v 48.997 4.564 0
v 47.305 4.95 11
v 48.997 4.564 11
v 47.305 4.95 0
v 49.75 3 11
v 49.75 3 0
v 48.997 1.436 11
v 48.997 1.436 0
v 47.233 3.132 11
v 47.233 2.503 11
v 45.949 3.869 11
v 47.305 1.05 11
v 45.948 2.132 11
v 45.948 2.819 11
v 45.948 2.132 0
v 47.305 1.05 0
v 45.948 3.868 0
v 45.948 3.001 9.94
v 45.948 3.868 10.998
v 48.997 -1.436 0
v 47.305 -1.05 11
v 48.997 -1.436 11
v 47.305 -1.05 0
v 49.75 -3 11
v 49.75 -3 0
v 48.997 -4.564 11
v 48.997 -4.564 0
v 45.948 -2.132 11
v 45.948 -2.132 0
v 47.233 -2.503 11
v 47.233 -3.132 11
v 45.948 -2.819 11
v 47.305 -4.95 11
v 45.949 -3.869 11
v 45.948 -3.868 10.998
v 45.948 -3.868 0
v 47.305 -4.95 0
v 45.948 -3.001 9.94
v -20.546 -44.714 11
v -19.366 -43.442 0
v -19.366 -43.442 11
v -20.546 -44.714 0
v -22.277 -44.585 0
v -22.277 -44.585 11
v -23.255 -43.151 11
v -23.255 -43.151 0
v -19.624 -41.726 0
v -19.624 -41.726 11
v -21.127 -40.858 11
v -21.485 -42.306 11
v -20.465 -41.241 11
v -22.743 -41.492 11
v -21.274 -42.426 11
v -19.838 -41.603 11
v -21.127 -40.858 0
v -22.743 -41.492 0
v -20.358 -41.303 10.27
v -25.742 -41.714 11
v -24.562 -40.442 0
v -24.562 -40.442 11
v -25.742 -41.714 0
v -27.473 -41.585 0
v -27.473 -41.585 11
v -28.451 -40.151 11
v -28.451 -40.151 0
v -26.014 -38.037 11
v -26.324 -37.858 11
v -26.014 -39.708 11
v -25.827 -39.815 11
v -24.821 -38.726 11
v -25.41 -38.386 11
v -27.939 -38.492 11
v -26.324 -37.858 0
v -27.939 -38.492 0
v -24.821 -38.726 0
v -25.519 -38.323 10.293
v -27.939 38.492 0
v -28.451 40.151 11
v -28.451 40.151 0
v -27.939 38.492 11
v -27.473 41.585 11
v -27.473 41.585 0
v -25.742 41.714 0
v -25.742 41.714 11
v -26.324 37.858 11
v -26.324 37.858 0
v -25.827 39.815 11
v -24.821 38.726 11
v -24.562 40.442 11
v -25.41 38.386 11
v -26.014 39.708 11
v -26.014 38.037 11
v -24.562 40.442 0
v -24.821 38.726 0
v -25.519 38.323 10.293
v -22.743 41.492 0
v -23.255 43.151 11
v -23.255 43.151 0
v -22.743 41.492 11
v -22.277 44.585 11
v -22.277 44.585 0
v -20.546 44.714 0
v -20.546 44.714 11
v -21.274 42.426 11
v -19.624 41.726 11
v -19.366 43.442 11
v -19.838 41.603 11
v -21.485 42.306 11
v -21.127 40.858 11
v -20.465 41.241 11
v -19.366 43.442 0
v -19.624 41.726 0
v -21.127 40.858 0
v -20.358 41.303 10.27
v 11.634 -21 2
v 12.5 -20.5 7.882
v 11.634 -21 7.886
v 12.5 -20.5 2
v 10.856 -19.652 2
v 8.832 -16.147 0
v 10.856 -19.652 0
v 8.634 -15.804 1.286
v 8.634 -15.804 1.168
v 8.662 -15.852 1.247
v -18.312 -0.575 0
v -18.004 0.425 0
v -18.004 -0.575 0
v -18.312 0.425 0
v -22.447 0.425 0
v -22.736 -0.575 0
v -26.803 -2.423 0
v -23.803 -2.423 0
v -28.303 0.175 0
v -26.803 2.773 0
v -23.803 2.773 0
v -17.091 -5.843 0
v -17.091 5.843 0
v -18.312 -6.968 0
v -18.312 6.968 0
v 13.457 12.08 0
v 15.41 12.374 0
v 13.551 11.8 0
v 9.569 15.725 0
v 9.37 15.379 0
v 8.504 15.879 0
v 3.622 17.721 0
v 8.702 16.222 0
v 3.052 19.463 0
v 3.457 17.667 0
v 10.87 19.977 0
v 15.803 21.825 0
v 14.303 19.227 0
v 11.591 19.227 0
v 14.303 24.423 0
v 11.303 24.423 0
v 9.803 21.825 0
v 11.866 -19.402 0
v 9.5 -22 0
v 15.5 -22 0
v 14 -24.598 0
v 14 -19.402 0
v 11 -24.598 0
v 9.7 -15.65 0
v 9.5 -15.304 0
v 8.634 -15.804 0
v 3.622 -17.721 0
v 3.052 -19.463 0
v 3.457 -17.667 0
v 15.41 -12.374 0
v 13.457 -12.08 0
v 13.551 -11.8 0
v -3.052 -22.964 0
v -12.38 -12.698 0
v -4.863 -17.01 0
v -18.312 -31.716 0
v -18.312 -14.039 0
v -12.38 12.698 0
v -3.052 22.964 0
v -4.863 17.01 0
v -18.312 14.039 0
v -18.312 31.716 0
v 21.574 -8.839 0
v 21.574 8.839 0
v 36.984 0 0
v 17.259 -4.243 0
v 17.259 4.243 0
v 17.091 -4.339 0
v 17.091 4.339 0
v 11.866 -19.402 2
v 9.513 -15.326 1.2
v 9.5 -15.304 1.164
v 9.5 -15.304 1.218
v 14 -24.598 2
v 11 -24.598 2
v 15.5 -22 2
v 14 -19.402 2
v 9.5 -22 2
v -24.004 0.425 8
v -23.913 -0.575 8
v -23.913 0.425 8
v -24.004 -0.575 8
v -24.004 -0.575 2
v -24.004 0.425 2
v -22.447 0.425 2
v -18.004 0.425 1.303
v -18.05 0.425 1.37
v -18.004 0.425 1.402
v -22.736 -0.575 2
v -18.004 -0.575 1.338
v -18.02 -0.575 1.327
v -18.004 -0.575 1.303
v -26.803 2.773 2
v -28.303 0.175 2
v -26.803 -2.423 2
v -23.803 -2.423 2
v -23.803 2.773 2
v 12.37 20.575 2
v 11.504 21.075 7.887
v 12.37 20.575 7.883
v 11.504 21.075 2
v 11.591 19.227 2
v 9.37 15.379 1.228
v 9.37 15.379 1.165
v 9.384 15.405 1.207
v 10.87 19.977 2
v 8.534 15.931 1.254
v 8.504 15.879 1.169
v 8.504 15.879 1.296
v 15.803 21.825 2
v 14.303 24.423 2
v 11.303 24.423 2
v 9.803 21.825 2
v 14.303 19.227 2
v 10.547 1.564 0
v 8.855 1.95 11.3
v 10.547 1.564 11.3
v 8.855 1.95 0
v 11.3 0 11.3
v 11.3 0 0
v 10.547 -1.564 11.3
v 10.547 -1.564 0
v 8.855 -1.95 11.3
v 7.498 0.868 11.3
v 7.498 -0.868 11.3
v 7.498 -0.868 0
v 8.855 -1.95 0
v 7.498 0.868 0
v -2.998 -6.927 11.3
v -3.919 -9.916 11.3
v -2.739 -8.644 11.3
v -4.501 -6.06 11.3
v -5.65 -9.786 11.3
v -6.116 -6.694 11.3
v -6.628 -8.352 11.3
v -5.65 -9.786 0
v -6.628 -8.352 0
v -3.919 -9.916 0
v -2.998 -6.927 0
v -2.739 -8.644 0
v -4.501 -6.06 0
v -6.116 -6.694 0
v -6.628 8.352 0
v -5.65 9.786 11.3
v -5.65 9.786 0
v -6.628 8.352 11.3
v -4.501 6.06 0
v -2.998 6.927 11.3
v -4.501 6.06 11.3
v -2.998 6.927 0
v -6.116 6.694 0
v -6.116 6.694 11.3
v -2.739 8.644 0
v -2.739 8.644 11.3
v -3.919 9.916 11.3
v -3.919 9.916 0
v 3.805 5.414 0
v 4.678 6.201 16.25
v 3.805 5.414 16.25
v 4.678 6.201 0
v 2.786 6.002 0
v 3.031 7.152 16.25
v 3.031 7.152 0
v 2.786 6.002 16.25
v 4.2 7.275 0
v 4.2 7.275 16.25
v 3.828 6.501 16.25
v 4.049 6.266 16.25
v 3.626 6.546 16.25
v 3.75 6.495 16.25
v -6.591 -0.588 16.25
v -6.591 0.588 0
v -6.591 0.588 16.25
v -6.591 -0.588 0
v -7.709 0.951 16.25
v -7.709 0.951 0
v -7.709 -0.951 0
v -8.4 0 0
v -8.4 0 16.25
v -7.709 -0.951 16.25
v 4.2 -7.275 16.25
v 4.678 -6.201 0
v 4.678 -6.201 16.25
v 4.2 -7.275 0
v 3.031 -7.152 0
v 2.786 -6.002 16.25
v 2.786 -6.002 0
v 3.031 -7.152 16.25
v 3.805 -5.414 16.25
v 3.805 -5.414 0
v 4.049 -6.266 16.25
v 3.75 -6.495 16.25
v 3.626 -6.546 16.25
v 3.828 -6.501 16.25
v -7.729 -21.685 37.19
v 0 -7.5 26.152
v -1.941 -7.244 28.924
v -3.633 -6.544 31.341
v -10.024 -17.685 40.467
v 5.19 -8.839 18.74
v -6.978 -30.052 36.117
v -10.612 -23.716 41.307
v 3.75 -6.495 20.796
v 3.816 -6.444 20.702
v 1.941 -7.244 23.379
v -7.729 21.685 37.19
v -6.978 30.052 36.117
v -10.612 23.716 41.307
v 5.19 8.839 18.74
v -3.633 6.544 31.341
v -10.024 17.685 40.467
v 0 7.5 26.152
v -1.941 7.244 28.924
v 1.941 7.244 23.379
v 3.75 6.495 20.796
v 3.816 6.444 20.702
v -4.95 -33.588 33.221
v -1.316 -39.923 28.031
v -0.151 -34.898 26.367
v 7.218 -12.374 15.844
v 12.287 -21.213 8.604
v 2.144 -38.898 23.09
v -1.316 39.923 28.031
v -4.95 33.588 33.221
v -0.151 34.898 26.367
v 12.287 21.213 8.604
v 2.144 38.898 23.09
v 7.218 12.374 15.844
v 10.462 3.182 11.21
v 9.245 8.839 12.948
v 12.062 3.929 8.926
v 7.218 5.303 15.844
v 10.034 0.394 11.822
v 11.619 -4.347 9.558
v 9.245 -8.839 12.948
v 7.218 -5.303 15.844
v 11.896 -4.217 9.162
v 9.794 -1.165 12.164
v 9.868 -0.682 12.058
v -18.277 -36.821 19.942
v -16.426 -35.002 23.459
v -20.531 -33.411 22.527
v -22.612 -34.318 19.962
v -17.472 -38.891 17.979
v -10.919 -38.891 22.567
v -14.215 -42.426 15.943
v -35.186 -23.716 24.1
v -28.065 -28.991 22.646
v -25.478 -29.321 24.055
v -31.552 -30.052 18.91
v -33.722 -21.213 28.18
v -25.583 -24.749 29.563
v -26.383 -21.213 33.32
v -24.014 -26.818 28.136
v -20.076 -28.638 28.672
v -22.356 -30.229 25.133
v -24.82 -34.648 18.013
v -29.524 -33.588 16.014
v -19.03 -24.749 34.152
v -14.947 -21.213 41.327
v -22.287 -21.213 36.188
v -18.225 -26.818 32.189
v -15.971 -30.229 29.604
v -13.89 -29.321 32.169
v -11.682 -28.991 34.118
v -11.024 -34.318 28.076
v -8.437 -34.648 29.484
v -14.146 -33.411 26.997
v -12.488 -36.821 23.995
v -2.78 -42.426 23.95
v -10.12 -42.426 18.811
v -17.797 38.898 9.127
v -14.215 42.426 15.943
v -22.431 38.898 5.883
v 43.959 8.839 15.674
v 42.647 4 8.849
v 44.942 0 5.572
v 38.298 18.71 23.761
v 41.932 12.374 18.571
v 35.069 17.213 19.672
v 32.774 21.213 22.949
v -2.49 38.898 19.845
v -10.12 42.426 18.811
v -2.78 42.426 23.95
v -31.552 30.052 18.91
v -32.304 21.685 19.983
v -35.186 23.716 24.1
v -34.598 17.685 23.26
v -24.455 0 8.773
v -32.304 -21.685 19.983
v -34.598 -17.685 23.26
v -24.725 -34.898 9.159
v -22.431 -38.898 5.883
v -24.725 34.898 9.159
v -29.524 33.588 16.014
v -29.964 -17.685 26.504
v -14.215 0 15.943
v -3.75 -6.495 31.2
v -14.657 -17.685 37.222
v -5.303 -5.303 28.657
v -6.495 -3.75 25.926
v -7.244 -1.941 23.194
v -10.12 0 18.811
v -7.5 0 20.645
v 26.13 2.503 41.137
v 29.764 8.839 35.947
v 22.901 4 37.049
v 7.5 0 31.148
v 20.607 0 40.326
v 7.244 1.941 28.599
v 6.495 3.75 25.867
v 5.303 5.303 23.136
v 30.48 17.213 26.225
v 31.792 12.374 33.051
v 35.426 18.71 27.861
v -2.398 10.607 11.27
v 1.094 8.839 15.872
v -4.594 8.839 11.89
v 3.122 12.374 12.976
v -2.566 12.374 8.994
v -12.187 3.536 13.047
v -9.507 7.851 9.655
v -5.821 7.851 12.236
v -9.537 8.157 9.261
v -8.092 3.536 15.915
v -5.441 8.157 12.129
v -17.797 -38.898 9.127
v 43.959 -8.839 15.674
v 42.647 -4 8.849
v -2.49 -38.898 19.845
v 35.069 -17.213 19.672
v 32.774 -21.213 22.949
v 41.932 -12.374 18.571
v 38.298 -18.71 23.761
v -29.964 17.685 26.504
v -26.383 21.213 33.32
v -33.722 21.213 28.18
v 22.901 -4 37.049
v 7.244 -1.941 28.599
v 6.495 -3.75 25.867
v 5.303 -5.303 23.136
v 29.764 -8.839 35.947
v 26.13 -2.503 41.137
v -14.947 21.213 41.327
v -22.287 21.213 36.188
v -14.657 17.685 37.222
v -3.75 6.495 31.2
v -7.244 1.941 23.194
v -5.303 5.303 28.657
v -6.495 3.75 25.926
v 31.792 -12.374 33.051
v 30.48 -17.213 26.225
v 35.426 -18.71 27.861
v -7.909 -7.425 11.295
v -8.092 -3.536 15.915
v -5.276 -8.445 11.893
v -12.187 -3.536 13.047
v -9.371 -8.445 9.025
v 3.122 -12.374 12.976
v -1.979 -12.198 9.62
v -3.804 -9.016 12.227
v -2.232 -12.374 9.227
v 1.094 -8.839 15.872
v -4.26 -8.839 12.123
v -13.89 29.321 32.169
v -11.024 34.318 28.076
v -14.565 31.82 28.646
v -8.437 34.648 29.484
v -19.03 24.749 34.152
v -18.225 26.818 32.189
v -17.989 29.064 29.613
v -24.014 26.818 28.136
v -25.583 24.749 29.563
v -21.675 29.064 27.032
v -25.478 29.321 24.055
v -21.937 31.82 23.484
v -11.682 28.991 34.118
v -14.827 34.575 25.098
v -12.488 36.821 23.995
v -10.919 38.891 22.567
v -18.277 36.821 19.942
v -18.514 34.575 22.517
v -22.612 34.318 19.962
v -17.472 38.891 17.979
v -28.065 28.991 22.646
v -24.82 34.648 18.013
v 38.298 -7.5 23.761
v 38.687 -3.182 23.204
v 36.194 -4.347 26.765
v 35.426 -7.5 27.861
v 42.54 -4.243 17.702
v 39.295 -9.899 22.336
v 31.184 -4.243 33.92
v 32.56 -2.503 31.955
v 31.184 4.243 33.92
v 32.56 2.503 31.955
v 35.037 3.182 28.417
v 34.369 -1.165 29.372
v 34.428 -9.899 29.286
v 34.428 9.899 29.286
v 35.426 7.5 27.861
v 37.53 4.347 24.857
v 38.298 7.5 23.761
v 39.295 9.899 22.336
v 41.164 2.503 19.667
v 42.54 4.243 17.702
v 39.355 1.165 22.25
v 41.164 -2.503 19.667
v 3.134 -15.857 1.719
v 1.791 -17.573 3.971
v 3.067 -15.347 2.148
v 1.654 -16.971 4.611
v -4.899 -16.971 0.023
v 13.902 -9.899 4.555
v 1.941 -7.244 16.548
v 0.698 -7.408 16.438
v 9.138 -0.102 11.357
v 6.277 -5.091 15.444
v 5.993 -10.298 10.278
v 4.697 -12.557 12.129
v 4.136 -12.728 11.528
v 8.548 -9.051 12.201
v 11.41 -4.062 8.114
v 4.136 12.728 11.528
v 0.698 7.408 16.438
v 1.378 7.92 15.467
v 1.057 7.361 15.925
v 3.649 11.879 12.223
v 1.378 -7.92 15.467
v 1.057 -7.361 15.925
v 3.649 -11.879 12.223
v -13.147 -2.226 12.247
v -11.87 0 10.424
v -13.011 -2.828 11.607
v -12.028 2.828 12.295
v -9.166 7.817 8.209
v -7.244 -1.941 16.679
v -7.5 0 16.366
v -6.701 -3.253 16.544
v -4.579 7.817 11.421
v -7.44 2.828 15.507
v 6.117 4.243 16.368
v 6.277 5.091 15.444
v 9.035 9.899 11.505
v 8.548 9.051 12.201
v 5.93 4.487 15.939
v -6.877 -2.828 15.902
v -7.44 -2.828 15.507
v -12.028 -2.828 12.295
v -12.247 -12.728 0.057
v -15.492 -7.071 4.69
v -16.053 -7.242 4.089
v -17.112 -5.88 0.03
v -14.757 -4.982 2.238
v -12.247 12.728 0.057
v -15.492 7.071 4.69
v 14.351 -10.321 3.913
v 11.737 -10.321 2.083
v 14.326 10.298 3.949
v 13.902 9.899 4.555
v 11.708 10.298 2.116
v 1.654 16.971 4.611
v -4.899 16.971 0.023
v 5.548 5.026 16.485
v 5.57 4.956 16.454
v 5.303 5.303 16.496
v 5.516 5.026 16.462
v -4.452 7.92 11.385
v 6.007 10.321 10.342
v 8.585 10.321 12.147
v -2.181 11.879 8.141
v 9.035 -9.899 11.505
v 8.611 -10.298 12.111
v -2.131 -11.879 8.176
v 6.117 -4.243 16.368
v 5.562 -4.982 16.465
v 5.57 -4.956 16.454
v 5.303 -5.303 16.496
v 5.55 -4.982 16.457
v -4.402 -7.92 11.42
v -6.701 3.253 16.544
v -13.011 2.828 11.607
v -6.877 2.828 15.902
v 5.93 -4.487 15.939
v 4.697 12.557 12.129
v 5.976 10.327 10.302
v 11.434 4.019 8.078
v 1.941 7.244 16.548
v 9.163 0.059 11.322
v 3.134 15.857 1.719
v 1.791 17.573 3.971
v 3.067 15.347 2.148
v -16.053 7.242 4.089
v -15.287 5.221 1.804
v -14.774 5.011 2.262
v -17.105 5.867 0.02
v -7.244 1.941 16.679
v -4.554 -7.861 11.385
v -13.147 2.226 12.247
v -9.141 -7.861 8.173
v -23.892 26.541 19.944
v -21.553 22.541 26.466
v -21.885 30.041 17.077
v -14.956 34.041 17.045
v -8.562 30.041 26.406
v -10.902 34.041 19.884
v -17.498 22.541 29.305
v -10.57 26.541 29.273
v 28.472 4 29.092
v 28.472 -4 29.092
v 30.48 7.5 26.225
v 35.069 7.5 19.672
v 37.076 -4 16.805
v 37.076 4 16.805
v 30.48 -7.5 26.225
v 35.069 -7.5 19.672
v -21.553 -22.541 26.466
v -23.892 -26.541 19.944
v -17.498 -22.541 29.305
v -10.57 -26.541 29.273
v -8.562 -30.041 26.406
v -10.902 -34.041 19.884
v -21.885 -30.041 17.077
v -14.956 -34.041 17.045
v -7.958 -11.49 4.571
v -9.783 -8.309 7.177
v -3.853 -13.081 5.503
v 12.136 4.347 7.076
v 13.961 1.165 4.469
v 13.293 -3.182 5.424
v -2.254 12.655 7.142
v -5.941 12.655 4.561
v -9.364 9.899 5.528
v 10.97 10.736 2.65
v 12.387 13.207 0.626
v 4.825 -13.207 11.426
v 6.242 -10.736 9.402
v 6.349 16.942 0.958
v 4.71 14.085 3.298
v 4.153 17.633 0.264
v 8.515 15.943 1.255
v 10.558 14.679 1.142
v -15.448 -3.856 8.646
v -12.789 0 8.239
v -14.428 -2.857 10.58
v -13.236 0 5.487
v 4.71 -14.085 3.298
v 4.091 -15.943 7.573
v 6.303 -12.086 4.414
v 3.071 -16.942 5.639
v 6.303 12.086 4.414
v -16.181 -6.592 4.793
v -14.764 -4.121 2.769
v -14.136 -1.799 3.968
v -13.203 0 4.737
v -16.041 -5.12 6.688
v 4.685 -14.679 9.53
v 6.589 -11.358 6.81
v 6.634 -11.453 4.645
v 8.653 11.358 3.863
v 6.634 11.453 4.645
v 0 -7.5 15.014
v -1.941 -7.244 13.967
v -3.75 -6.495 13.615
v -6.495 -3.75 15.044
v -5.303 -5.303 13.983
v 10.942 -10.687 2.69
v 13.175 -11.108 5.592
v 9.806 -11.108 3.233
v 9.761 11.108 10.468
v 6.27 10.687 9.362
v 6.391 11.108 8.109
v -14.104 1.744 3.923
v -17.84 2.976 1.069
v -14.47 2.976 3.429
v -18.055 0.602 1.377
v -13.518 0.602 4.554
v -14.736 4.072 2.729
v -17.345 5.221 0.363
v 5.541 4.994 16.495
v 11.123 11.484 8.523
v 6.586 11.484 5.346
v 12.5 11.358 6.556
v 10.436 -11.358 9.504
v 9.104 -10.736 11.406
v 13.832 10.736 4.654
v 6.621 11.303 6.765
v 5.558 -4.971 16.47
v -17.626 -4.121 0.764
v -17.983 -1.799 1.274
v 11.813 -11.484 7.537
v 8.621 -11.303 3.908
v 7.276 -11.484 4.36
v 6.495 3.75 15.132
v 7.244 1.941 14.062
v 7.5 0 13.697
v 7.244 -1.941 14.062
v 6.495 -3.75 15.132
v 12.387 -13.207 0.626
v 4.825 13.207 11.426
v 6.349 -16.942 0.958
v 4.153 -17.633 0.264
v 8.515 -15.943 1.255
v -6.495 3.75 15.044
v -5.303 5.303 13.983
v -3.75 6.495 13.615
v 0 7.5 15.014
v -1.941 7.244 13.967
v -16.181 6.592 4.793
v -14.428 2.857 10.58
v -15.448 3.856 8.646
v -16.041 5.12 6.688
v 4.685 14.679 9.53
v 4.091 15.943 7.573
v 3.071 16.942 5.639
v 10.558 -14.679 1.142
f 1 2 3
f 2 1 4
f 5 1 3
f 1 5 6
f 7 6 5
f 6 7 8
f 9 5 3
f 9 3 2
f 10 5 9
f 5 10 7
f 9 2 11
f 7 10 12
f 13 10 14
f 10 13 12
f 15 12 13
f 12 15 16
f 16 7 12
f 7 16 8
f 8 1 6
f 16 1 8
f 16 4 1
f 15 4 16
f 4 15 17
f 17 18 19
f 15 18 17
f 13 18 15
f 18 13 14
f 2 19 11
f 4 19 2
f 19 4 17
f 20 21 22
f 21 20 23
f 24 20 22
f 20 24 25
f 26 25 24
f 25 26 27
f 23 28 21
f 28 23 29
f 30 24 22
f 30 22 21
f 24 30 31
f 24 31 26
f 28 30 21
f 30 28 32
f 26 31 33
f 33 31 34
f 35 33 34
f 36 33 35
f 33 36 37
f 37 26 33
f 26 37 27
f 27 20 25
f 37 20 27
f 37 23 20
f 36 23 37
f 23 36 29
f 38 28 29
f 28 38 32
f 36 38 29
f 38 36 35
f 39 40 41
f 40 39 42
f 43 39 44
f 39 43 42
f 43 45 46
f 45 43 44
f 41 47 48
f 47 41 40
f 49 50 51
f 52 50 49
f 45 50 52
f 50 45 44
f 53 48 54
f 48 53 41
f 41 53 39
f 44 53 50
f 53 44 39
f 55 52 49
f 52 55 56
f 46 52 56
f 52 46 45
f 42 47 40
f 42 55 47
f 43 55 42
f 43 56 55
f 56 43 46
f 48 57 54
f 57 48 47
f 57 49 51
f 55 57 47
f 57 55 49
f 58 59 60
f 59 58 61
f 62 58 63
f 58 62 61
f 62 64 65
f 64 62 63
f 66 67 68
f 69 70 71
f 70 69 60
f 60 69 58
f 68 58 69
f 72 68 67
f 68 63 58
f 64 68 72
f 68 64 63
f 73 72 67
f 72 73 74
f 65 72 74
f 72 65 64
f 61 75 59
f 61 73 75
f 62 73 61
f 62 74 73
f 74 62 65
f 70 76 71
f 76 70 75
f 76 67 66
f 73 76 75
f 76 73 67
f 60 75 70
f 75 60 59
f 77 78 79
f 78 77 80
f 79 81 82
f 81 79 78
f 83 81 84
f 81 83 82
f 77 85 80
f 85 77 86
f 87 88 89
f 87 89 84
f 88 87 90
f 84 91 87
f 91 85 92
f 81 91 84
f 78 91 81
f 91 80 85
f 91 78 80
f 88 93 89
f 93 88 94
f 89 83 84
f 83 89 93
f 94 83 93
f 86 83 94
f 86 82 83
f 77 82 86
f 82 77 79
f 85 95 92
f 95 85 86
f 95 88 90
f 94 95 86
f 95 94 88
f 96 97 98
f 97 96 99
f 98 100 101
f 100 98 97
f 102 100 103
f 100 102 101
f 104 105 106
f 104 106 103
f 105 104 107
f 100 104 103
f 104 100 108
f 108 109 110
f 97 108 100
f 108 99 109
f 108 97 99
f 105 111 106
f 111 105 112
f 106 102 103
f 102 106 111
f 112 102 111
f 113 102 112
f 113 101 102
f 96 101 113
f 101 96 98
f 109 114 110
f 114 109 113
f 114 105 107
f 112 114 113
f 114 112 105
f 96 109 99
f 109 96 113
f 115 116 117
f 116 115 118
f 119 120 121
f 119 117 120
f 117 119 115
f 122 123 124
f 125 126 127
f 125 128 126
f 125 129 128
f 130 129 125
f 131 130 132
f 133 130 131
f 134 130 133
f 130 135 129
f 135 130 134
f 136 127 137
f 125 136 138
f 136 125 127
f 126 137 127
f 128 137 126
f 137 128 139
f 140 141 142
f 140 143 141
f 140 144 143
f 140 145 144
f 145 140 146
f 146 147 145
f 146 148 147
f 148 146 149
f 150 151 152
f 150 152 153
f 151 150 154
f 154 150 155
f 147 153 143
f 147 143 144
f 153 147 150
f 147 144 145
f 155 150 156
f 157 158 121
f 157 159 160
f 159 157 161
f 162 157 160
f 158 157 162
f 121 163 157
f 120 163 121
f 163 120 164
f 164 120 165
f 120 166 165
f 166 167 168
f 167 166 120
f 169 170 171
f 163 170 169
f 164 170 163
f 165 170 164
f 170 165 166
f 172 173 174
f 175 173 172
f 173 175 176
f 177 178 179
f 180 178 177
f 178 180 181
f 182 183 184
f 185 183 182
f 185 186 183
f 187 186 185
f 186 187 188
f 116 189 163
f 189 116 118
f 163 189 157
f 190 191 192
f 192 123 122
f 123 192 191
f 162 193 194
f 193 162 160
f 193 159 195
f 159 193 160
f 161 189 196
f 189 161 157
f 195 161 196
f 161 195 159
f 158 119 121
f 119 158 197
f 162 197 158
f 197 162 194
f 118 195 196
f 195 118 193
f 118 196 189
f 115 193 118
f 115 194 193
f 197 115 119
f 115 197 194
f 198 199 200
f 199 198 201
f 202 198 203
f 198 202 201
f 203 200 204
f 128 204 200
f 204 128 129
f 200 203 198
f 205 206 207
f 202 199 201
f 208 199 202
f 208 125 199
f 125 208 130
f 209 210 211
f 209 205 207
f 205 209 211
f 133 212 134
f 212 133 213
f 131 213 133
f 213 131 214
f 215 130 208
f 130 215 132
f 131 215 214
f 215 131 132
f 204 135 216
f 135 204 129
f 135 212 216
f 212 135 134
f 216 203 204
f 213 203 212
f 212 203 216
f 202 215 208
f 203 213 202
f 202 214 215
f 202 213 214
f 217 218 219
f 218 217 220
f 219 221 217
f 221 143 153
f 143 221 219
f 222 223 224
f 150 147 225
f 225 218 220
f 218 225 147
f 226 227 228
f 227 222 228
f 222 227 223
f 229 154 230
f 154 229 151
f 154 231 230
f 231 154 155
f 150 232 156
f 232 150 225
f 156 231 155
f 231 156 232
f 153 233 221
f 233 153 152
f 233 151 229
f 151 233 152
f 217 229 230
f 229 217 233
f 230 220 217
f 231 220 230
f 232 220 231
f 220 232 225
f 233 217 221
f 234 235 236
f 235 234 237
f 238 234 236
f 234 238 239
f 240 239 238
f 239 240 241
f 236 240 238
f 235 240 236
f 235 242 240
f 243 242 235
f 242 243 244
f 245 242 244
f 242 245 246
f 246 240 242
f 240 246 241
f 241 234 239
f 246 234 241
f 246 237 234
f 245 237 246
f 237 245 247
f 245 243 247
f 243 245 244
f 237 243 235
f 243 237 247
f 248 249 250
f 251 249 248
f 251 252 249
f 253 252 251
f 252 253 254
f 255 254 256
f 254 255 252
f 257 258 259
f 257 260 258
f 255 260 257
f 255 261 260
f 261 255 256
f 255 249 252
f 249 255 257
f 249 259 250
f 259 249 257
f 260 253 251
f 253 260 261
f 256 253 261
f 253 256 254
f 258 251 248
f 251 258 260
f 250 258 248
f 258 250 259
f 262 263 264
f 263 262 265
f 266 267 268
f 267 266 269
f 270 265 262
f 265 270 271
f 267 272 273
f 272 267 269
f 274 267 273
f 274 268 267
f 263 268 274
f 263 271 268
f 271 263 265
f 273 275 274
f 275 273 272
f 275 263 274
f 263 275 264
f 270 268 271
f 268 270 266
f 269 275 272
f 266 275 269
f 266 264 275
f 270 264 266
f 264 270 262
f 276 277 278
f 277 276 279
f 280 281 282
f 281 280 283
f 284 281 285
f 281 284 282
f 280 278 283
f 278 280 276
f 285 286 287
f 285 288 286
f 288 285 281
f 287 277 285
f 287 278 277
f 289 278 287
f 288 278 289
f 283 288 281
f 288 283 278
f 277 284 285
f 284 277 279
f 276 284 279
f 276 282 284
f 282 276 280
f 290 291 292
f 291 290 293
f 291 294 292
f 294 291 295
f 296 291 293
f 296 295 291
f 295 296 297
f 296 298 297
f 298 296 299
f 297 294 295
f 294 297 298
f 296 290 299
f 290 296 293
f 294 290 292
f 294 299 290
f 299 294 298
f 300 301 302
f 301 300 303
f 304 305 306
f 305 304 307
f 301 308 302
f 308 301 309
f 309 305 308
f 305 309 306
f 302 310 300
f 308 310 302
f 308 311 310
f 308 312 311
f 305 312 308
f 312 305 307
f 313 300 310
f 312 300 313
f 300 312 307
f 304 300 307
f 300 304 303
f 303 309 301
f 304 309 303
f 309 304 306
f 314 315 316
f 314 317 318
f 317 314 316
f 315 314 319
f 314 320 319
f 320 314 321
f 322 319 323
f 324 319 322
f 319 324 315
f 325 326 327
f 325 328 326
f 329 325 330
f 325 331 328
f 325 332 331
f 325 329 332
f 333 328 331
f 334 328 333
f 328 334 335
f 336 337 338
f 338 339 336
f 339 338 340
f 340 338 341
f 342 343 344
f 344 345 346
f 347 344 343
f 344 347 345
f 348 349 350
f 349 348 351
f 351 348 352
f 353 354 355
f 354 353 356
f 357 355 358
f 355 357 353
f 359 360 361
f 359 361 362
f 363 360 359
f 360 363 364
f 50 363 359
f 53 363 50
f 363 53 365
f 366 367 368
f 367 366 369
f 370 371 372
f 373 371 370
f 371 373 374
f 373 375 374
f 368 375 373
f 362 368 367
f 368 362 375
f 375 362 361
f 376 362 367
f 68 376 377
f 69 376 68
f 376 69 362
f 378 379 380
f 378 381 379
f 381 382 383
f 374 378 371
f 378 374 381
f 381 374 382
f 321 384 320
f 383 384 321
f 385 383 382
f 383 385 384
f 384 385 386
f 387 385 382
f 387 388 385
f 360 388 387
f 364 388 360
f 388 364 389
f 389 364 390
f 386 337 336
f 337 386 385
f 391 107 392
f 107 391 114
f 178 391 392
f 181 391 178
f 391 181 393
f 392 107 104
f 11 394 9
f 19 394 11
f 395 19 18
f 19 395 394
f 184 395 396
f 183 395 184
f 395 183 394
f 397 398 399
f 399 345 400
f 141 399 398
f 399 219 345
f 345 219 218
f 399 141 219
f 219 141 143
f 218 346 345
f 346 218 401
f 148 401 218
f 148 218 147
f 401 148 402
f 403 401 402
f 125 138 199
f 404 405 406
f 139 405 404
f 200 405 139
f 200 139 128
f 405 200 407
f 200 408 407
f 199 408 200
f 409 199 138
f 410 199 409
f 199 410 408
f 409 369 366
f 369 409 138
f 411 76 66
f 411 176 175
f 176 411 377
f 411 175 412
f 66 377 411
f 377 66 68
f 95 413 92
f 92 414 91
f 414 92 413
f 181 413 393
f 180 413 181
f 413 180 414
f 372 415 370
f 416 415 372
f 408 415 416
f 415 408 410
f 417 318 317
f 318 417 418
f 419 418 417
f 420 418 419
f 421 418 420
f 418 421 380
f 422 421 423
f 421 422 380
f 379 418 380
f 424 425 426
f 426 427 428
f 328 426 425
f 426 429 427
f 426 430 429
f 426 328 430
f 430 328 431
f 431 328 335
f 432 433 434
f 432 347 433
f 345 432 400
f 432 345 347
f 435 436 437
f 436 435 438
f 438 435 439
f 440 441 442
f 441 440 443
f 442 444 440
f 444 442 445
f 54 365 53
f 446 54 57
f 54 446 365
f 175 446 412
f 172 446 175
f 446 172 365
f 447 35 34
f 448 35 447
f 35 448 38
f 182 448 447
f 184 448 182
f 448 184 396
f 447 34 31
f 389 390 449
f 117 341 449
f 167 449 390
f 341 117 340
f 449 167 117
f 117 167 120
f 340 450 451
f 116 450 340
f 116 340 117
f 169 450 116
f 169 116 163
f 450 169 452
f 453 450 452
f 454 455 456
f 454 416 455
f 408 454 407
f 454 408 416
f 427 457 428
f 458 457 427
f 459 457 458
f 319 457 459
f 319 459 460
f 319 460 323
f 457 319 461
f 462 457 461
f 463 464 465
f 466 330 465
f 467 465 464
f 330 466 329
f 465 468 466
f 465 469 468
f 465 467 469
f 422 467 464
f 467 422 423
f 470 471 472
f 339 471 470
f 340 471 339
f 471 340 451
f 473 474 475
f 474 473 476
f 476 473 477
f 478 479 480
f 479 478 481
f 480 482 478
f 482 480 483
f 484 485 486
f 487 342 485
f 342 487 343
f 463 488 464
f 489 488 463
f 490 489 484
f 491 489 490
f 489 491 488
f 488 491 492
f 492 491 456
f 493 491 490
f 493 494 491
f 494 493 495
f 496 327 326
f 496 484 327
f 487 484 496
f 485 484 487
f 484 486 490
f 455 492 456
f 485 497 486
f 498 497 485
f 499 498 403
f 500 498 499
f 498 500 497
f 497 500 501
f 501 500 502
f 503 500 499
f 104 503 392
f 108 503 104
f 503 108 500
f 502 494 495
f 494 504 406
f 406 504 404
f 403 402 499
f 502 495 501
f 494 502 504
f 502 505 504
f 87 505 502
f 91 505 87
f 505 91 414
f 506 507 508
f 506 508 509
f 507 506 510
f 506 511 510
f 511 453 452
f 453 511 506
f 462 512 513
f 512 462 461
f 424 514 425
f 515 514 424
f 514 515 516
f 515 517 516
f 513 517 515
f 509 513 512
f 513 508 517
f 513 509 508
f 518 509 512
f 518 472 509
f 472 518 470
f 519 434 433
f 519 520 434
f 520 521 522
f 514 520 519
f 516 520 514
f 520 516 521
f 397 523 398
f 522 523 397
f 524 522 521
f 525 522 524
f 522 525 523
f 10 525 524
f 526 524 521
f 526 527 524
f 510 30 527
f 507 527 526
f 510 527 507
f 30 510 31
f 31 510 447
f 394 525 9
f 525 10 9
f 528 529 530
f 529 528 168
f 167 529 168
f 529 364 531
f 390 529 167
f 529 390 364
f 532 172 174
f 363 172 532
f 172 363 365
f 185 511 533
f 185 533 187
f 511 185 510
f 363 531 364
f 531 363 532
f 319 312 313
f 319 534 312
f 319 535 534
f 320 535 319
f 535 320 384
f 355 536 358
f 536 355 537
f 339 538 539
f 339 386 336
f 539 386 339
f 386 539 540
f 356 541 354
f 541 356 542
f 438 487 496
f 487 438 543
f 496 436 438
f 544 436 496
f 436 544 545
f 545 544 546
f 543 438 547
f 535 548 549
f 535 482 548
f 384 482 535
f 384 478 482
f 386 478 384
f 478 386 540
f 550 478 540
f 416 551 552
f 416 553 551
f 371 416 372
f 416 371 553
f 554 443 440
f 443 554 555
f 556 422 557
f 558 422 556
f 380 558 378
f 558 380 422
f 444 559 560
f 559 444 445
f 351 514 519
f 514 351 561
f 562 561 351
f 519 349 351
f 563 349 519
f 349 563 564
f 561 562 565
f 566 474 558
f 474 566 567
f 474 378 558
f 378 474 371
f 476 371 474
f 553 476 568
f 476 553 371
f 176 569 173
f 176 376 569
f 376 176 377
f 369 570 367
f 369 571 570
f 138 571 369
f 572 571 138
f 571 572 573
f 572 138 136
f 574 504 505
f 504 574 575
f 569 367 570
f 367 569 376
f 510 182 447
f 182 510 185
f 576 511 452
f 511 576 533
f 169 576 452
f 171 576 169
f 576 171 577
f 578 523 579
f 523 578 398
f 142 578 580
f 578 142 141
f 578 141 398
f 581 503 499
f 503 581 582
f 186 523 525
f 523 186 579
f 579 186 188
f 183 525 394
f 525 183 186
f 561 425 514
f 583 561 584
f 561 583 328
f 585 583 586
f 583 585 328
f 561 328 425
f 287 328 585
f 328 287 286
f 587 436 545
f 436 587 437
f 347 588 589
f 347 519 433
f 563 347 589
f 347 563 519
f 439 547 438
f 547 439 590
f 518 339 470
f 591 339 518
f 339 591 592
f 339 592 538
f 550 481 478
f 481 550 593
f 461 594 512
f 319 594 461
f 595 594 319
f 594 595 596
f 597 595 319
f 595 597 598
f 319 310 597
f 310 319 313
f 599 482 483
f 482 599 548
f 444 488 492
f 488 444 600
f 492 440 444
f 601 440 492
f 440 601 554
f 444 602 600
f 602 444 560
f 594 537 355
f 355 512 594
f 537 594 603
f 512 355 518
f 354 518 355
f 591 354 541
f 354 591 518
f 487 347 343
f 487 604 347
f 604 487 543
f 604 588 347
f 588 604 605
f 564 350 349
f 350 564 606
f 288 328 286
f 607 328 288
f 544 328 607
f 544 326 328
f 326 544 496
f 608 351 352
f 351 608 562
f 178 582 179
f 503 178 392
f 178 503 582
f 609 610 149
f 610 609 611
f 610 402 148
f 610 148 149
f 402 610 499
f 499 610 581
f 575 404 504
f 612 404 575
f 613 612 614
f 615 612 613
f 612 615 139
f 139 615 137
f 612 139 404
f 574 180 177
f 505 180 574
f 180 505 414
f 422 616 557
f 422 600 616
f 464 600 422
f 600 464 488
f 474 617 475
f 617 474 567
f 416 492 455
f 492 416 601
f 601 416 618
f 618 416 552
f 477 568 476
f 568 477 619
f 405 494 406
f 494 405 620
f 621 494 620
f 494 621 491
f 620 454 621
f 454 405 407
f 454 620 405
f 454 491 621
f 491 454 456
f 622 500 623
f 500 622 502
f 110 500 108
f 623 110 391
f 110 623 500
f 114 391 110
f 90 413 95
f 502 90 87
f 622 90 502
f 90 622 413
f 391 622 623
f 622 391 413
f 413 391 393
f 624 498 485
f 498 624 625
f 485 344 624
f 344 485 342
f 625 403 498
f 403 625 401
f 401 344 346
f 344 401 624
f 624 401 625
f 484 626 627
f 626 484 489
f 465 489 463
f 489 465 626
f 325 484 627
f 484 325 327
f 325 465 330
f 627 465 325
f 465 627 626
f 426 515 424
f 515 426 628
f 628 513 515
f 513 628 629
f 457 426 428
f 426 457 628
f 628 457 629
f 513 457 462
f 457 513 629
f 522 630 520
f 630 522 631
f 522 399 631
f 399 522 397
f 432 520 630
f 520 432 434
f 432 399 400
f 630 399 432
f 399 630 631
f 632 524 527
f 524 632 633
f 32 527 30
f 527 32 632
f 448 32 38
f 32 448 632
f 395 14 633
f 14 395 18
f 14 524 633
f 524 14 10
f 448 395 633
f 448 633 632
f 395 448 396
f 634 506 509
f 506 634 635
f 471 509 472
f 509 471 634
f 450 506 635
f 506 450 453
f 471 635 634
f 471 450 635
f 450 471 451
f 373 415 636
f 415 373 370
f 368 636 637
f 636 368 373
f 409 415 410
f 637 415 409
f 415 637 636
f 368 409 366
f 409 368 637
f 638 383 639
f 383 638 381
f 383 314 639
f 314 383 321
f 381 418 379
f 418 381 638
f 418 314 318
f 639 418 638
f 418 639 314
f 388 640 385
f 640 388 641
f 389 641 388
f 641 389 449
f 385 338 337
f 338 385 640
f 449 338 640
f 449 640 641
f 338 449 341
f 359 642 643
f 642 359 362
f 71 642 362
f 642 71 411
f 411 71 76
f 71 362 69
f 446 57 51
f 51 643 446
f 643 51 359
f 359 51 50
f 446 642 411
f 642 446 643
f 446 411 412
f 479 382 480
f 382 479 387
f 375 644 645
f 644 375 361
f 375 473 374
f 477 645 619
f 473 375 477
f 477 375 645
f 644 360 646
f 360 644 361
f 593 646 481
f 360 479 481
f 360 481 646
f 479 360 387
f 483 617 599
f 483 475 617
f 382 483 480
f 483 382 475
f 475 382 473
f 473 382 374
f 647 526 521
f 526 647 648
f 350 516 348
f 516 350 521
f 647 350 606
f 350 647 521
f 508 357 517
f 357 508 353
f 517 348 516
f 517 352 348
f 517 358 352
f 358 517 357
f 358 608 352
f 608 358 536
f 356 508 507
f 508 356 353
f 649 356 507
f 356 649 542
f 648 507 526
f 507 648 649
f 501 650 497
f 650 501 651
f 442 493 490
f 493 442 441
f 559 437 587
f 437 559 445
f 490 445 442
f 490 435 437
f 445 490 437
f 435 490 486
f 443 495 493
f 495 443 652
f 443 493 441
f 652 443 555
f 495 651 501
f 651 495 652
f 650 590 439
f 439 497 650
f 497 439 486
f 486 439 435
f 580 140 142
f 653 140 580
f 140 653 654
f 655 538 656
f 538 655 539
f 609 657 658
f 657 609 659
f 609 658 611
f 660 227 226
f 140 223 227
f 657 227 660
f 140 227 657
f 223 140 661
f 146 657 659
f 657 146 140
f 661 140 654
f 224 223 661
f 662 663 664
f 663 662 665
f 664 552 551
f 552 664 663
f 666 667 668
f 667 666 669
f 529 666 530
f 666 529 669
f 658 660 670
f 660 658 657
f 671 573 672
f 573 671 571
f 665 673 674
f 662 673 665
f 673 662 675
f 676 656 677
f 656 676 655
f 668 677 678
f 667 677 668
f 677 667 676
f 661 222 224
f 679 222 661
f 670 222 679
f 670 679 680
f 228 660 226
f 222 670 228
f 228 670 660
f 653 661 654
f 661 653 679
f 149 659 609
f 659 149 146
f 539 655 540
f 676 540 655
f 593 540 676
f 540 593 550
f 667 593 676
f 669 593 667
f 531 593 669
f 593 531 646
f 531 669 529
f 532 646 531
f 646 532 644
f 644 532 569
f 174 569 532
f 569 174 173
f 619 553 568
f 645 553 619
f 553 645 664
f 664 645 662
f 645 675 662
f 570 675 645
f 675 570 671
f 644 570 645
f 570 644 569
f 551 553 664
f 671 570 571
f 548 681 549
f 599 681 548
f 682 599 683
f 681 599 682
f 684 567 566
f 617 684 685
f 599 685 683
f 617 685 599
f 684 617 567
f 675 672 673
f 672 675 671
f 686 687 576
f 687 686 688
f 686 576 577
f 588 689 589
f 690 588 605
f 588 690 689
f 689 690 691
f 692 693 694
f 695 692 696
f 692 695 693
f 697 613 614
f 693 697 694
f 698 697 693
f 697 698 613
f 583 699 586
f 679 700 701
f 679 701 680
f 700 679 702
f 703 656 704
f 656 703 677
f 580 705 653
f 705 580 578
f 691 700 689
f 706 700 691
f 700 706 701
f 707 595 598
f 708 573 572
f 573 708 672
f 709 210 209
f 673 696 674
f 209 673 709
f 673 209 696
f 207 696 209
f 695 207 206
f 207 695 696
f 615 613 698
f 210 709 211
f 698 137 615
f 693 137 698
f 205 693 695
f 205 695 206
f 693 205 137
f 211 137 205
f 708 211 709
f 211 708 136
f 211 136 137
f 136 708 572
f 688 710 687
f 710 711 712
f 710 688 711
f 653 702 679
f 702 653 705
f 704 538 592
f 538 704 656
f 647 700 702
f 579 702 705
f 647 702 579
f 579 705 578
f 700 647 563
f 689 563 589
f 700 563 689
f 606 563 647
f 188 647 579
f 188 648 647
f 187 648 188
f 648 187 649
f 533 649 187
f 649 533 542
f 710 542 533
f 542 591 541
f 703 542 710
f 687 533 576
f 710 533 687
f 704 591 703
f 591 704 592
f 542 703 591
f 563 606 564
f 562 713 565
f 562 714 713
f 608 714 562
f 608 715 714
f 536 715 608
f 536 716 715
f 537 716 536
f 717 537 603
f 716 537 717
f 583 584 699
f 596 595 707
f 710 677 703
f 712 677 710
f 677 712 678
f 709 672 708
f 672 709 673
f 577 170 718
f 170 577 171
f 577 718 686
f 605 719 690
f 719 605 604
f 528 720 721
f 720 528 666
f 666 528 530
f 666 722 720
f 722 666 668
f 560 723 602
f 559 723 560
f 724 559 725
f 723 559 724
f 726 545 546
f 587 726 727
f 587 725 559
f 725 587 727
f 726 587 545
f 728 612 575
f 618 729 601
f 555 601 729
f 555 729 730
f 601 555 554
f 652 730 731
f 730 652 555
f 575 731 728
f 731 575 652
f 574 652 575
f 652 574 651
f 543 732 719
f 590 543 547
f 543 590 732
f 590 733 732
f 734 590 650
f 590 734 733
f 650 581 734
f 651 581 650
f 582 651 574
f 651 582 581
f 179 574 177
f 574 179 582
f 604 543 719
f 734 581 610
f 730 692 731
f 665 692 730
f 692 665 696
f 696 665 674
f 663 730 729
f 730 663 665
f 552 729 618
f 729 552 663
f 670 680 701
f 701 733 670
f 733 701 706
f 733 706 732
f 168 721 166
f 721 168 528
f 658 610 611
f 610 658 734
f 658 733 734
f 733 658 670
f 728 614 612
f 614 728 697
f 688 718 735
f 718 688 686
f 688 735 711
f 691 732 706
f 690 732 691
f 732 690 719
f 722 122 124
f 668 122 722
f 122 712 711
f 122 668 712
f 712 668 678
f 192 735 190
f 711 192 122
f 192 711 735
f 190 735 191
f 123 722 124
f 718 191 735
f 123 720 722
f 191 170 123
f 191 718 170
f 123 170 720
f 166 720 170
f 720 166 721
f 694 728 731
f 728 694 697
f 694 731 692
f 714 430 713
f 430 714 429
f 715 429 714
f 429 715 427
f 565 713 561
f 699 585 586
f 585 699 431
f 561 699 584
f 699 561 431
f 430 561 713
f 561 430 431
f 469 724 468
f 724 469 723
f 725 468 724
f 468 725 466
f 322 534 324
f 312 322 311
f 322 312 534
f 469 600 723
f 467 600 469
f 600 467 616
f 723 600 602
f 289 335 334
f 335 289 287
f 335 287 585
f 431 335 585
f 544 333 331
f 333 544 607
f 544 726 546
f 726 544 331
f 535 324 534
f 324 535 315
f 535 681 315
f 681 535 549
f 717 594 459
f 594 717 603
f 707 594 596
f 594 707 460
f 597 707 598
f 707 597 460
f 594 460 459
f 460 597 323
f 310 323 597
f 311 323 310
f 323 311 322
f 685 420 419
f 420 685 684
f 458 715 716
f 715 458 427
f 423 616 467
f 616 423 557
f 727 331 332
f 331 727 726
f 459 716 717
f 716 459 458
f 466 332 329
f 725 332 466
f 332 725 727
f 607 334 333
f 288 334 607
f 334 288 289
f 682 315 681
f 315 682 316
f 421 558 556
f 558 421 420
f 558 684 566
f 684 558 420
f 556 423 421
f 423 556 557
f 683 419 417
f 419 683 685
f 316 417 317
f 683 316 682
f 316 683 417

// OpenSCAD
// file: ../../globals.scad
/*
Most things in this file is represented as one millimeter, so keep that in mind while changing things.
Some of the setting are not mm but at variables that you can set, such as 2*x=2x and you are setting what x is.
I will try to specify when things are variables and not exact measurements.
*/

// printer slop, used by snappy parts
slop = 0.15;

//Virindi settings
dovetail_male_width_scale = 0.98;
dovetail_male_height_scale = 0.91;

obj_leg = 30;
leg_length = 5.5;
small_number = 0.001;
metal_core_rode_global = 5;


///////////////// number of holes /////////////////////
z_hole_number = 8;
other_holes = 8;

///////////////// Pins /////////////////////

//pins that poke out
ball_size = 10;
pin_height = 20;
pin_diameter = 6;


//holes
hole_ball_size = ball_size;
hole_pin_height = pin_height;
hole_pin_diameter = pin_diameter;

///////////////// Z THINGS /////////////////////

berring_slot_width = 7.5;
berring_slot_depth = 6.5;
metal_core_rode = 5;

///////////////// X THINGS /////////////////////

//male dove tails
max_width=8;
min_width=5;
depth=5;
height=obj_leg/2;

//female dove tails, this is found on the y mounts
girl_max_width=11;
girl_min_width=5;
girl_depth=5;
girl_height=obj_leg;


///////////////// Y THINGS /////////////////////
/*
The Y is so normal that all of those global variables at the top should change all of the setting in it, this section is set her incase there are variables set in the future development of this project.
*/

// stepper
motor_side_length = 43.2;
motor_bolt_hole_distance = 31;
motor_center_hole = 23;
motor_shaft_dia = 5;
motor_shaft_hole_dia = 5+2*slop;

// bolts etc.
bolt_hole_dia = 3+2*slop;
bolt_head_hole_dia = 5.8;

m3_nut_side = 5.65;

// threaded rod
lifter_rod_diam = 9.86;
hole_threaded_rod = lifter_rod_diam+2*slop;
// file: ../../include.scad
use <globals.scad>

//////////////////      END SECTION       //////////////////

	module added_pins(){
		difference(){
			union(){
				translate([30/(15/4),obj_leg*leg_length,30/(15/4)]) pin();
				translate([30/(15/4)+14.5,obj_leg*leg_length,30/(15/4)+14]) pin();
			}
			union(){
							translate([30/(15/4)+13.5,obj_leg*leg_length-20,30/(15/4)+5])cube(size=[2,40,15]);
							translate([30/(15/4)+7.5,obj_leg*leg_length-20,30/(15/4)+15])rotate([0,90,0]) cube(size=[2,40,15]);	

							translate([30/(15/4)-1,obj_leg*leg_length-20,30/(15/4)-8])cube(size=[2,40,15]);
							translate([30/(15/4)-10,obj_leg*leg_length-20,30/(15/4)+1])rotate([0,90,0]) cube(size=[2,40,15]);
			}
		}
	}
	module taken_pins() {
		translate([30/(15/4)+14,obj_leg*leg_length-10,30/(15/4)]) mirror_pin();
		translate([30/(15/4),obj_leg*leg_length-10,30/(15/4)+15]) mirror_pin();
	}


//////////////////      OTHER STUFF       //////////////////

	module holes() {
		rotate([0,0,90]) for(y=[0:other_holes])
		translate([obj_leg+y*15,-15.5,7.5]) union() {
			translate([7.5,0,15]) hole_up();
			hole_down();
		}
	}
	module extend_holes() {
	module top(){
		rotate([0,0,90]) for(y=[0:other_holes+1])
		translate([(30/4)+y*15,-15.5,7.5]) union() {
			translate([7.5,0,15]) hole_up();
		}
	}
	module bottom(){
		rotate([0,0,90]) for(y=[0:other_holes+2])
		translate([(30/4)+y*15,-15.5,7.5]) union() {
			hole_down();
		
}
	}
	union(){
		top();
		bottom();
	}
	}

	module hole() {
		union() {
			rotate([90, 90, 0]) cylinder(h=40, d=hole_pin_diameter, center=true);
			translate([0,7.5,0]) sphere(d=hole_ball_size);
			translate([0,-6,0]) sphere(d=hole_ball_size);
		}
	}
	module hole_up() {
		union() {
			rotate([90, 90, 0]) cylinder(h=40, d=hole_pin_diameter, center=true);
			translate([0,7.5,10]) cylinder(h=hole_pin_height, d=hole_pin_diameter, center=true);
			translate([0,-6,10]) cylinder(h=hole_pin_height, d=hole_pin_diameter, center=true);
			translate([0,7.5,0]) sphere(d=hole_ball_size);
			translate([0,-6,0]) sphere(d=hole_ball_size);
		}
	}
	module hole_down() {
		union() {
			rotate([90, 90, 0]) cylinder(h=40, d=hole_pin_diameter, center=true);
			translate([0,7.5,-10]) cylinder(h=hole_pin_height, d=hole_pin_diameter, center=true);
			translate([0,-6,-10]) cylinder(h=hole_pin_height, d=hole_pin_diameter, center=true);
			translate([0,7.5,0]) sphere(d=hole_ball_size);
			translate([0,-6,0]) sphere(d=hole_ball_size);
		}
	}
	module pin() {
		union() {
			rotate([90, 90, 0]) cylinder(h=pin_height, d=pin_diameter, center=true);
			translate([0,7.5,0]) sphere(d=ball_size);
		}
	}

	module mirror_pin() {
		rotate([90, 90, 0]) cylinder(h=hole_pin_height+small_number, d=hole_pin_diameter, center=true);
		translate([0,-(pin_height-(ball_size/2)),0]) sphere(d=ball_size);
	}


//////////////////      SOME RACK AND Z THINGS       //////////////////

module z_holes() {
    rotate([0,-90,0]) for(z=[0:z_hole_number])
    translate([22.5+z*15,16,-12])
        hole();
}

module pin_cuts() {
	union(){
		cube(size=[2,10,40], center=true);
		rotate([0,0,90]) cube(size=[2,10,40], center=true);
	}
}
module pin_uncut() {
	union(){
		rotate([0, 0, 90]) cylinder(h=hole_pin_height, d=hole_pin_diameter, center=true);
		translate([0,0,10]) sphere(d=ball_hole);
	}
}


module pin_out() {
	union(){
		rotate([0, 0, 90]) cylinder(h=pin_height, d=pin_diameter, center=true);
		translate([0,0,10]) sphere(d= ball_size);
	}
}


module pins_z(){
	difference() {
		pin_out();
		pin_cuts();
	}
}

module rounded_cube(width,depth,height){
    hull(){
        translate([width/2-diameter/2,depth/2-diameter/2,height/2-diameter/2]) sphere(d=diameter);
        translate([width/2-(diameter/2),depth/2-(diameter/2),-height/2+(diameter/2)]) sphere(d=diameter);
        translate([-width/2+diameter/2,depth/2-diameter/2,height/2-diameter/2]) sphere(d=diameter);
        translate([-width/2+(diameter/2),depth/2-(diameter/2),-height/2+(diameter/2)]) sphere(d=diameter);
        
        translate([width/2-diameter/2,-depth/2+diameter/2,height/2-diameter/2]) sphere(d=diameter);
        translate([width/2-(diameter/2),-depth/2+(diameter/2),-height/2+(diameter/2)]) sphere(d=diameter);
        translate([-width/2+diameter/2,-depth/2+diameter/2,height/2-diameter/2]) sphere(d=diameter);
        translate([-width/2+(diameter/2),-depth/2+(diameter/2),-height/2+(diameter/2)]) sphere(d=diameter);
    }
}

module motor_shaft_hole(h=10) {
    difference() {
        cylinder(d=motor_shaft_hole_dia, h=h);
        translate([0,4.5,h/2]) cube([5,5,h], center=true); 
    }
}
//////////////////      RACK AND SLIDE     ///////////////////

module straight_pins() {
	for(z=[0:((((obj_leg*leg_length)*2)-(obj_leg*2))/3)/14.5]) rotate([-90,0,0]) translate([z*15,30/(15/4),14]) pins_z();
	for(z=[0:((((obj_leg*leg_length)*2)-(obj_leg*2))/3)/14.5]) rotate([-90,0,0]) translate([z*15,30/(15/4)-14,14]) pins_z();
}
module stagger_pins() {
	for(z=[0:((((obj_leg*leg_length)*2)-(obj_leg*2))/3)/14.5]) rotate([-90,0,0]) translate([z*15,30/(15/4),14]) pins_z();
	for(z=[0:((((obj_leg*leg_length)*2)-(obj_leg*2))/3)/14.5]) rotate([-90,0,0]) translate([z*15+7,30/(15/4)-14,14]) pins_z();
}


//////////////////      DOVE TAIL       //////////////////

module male_dovetail(height) {
	dovetail_3d(max_width,min_width,depth,height);
}

module dovetail_3d(max_width=11, min_width=5, depth=5, height=30) {
	linear_extrude(height=height, convexity=2)
		dovetail_2d(max_width,min_width,depth);
}

module dovetail_2d(max_width=11, min_width=5, depth=5) {
	angle=atan((max_width/2-min_width/2)/depth);
	echo("angle: ", angle);
	polygon(paths=[[0,1,2,3,0]], points=[[-min_width/2,0], [-max_width/2,depth], [max_width/2, depth], [min_width/2,0]]);
}

//bow tie
	module tie_end(height){
				rotate([0,0,0]) translate([0,-0.01,((obj_leg/2)/2)]) male_dovetail(height);
				rotate([0,90,0]) translate([0,-0.01,((obj_leg/2)/2)]) male_dovetail(height);
				rotate([0,180,0]) translate([0,-0.01,((obj_leg/2)/2)]) male_dovetail(height);
				rotate([0,-90,0]) translate([0,-0.01,((obj_leg/2)/2)]) male_dovetail(height);
	}

module bow_support(){
	difference(){
		intersection(){
			translate([-15,0,-15]) cube([30,9,30]);
			scale([1.05,1.05,1.05]) rotate([0,45,0]) tie_end();
		}
		cube([29.2,29.2,29.2], center=true);
	}
}

	module wrap(units){
	for (y = [-1:units-2]) // two iterations, z = -1, z = 1
	{
			translate([15, (y*30)+15, 15]){
			for (r = [0:4]) // two iterations, z = -1, z = 1
			{
				rotate([0,r*90,0]) translate([0,15,15]) rotate([-90,0,0])male_dovetail(height=30);
			}
		}
	}
	}
// main file
include <../../include.scad>;
include <../../globals.scad>;
//if you can do pretty far over hangs, like an SLA printer or something then take this off by setting it to false.
    support = true;
	slot_translate = .5;
	rod_size = .5;
module basic_corner(){
	module added(){
			translate([0,0,15]) cube([obj_leg,obj_leg,obj_leg*2], center=true);
			translate([0,15,0]) cube([obj_leg,obj_leg*2,obj_leg], center=true);
			translate([15,0,0]) cube([obj_leg*2,obj_leg,obj_leg], center=true);
	}
	module taken(){
		rotate([0,0,90]) cylinder(d=9, h=obj_leg*5, center=true, $fn=6);
		rotate([90,0,0]) rotate([0,90,0]) cylinder(d=9, h=obj_leg*5, center=true, $fn=6);
		rotate([90,0,0]) cylinder(d=9, h=obj_leg*5, center=true, $fn=6);
		cylinder(d=23, h=28, center=true);
		rotate([0,90,0]) cylinder(d=23, h=28, center=true);
		rotate([90,0,0]) cylinder(d=23, h=28, center=true);
		module wrap(){
			translate([0,-15,0]) male_dovetail(height=50);
			rotate([0,0,90]) translate([0,-15,0]) male_dovetail(height=50);
			rotate([0,0,180]) translate([0,-15,0]) male_dovetail(height=50);
			rotate([0,0,-90]) translate([0,-15,0]) male_dovetail(height=50);
		}
		wrap();
		rotate([0,90,0]) wrap();
		rotate([-90,90,0]) wrap();
		rotate([0,45,180]) translate([0,-45,0]) tie_end();
		rotate([0,45,90]) translate([0,-45,0]) tie_end();
		rotate([-90,0,45]) translate([0,-45,0]) tie_end();

	}
	module corner() {
		difference(){
			added();
			taken();
		}
	};
	rotate([45,0,0]) corner();
};
module full_corner(){

    module edge_pillers() {
        translate([12.5,-20.5,0]) {
            rotate(120) cube([6,1,8]);
            translate([0,-1.5,0]) cylinder(r=3, h=2, $fn=6);
        }
    }

	module support_pillers(){

        //These seem to not have a lot of effect.
		translate([48-slot_translate/2,3,0]) cylinder(h=11,d=4);
		translate([48-slot_translate/2,-3,0]) cylinder(h=11,d=4);

        //These do not perform well, joining with the part perimeter.
        //Support this area with slic3r supports. Set support overhang
        //threshold to do this.
        /*
        difference()
        {
            union(){
            translate([39-slot_translate/2,18,24]) rotate([0,-40,0]) cylinder(h=6,d=4);
            translate([39-slot_translate/2,-18,24]) rotate([0,-40,0]) cylinder(h=6,d=4);
            }
            translate([0,0,27.7+100])
            cube(200,200,200,center=true);

            translate([-100+(39-slot_translate/2)-3.9,0,0])
            cube(200,200,200,center=true);
        }
        */
	}
	if (support==true)
	{
		support_pillers();
		rotate([0,0,(360/3)*2]) support_pillers();
		rotate([0,0,(360/3)*1]) support_pillers();

        edge_pillers();
		rotate([0,0,(360/3)*2]) edge_pillers();
		rotate([0,0,(360/3)*1]) edge_pillers();

        //Center rod hole tops
        translate([9.3,0,0])
        cylinder(h=11.3,d=4);

        rotate([0,0,(360/3)*2])
        translate([9.3,0,0])
        cylinder(h=11.3,d=4);

        rotate([0,0,(360/3)*1])
        translate([9.3,0,0])
        cylinder(h=11.3,d=4);

        //Center vee
        rotate([0,0,(360/6)*1])
        translate([7.4,0,0])
        cylinder(h=16.25,d=2);

        rotate([0,0,(360/6)*1 + (360/3)*1])
        translate([7.4,0,0])
        cylinder(h=16.25,d=2);

        rotate([0,0,(360/6)*1 + (360/3)*2])
        translate([7.4,0,0])
        cylinder(h=16.25,d=2);
	}

	difference(){
		translate([0,0,0]) rotate([0,-35,0])basic_corner();
		union(){
			cylinder(h=50, d=15);
			//translate([-20,0,0]) cylinder(h=50, d=7);
			//translate([10,17,0]) cylinder(h=50, d=7);
			//translate([10,-17,0]) cylinder(h=50, d=7);
			translate([0,0,-25]) cube([200,200,50], center=true);
		}
	}
}

/*
//For 90 degree printing
translate([0,0,15])
rotate([-45,0,0])
rotate([0,35,0])
*/
full_corner();

/*
//For 90 degree printing
module supportside()
{
    sup_w = 4;

    translate([15.3,-16-sup_w,0])
    cube([29.7,sup_w,14]);

    difference()
    {
        union()
        {
            translate([15.3,-16-sup_w,14])
            rotate([-45,0,0])
            cube([29.7,sup_w,20]);
        }

        translate([0,0,17.5+50+6.3])
        rotate([16.7,0,0])
        cube([100,100,100],center=true);

        translate([0,50-16+5.5,0])
        cube([100,100,100],center=true);
    }
}

if (support == true)
{
    supportside();
}
*/
